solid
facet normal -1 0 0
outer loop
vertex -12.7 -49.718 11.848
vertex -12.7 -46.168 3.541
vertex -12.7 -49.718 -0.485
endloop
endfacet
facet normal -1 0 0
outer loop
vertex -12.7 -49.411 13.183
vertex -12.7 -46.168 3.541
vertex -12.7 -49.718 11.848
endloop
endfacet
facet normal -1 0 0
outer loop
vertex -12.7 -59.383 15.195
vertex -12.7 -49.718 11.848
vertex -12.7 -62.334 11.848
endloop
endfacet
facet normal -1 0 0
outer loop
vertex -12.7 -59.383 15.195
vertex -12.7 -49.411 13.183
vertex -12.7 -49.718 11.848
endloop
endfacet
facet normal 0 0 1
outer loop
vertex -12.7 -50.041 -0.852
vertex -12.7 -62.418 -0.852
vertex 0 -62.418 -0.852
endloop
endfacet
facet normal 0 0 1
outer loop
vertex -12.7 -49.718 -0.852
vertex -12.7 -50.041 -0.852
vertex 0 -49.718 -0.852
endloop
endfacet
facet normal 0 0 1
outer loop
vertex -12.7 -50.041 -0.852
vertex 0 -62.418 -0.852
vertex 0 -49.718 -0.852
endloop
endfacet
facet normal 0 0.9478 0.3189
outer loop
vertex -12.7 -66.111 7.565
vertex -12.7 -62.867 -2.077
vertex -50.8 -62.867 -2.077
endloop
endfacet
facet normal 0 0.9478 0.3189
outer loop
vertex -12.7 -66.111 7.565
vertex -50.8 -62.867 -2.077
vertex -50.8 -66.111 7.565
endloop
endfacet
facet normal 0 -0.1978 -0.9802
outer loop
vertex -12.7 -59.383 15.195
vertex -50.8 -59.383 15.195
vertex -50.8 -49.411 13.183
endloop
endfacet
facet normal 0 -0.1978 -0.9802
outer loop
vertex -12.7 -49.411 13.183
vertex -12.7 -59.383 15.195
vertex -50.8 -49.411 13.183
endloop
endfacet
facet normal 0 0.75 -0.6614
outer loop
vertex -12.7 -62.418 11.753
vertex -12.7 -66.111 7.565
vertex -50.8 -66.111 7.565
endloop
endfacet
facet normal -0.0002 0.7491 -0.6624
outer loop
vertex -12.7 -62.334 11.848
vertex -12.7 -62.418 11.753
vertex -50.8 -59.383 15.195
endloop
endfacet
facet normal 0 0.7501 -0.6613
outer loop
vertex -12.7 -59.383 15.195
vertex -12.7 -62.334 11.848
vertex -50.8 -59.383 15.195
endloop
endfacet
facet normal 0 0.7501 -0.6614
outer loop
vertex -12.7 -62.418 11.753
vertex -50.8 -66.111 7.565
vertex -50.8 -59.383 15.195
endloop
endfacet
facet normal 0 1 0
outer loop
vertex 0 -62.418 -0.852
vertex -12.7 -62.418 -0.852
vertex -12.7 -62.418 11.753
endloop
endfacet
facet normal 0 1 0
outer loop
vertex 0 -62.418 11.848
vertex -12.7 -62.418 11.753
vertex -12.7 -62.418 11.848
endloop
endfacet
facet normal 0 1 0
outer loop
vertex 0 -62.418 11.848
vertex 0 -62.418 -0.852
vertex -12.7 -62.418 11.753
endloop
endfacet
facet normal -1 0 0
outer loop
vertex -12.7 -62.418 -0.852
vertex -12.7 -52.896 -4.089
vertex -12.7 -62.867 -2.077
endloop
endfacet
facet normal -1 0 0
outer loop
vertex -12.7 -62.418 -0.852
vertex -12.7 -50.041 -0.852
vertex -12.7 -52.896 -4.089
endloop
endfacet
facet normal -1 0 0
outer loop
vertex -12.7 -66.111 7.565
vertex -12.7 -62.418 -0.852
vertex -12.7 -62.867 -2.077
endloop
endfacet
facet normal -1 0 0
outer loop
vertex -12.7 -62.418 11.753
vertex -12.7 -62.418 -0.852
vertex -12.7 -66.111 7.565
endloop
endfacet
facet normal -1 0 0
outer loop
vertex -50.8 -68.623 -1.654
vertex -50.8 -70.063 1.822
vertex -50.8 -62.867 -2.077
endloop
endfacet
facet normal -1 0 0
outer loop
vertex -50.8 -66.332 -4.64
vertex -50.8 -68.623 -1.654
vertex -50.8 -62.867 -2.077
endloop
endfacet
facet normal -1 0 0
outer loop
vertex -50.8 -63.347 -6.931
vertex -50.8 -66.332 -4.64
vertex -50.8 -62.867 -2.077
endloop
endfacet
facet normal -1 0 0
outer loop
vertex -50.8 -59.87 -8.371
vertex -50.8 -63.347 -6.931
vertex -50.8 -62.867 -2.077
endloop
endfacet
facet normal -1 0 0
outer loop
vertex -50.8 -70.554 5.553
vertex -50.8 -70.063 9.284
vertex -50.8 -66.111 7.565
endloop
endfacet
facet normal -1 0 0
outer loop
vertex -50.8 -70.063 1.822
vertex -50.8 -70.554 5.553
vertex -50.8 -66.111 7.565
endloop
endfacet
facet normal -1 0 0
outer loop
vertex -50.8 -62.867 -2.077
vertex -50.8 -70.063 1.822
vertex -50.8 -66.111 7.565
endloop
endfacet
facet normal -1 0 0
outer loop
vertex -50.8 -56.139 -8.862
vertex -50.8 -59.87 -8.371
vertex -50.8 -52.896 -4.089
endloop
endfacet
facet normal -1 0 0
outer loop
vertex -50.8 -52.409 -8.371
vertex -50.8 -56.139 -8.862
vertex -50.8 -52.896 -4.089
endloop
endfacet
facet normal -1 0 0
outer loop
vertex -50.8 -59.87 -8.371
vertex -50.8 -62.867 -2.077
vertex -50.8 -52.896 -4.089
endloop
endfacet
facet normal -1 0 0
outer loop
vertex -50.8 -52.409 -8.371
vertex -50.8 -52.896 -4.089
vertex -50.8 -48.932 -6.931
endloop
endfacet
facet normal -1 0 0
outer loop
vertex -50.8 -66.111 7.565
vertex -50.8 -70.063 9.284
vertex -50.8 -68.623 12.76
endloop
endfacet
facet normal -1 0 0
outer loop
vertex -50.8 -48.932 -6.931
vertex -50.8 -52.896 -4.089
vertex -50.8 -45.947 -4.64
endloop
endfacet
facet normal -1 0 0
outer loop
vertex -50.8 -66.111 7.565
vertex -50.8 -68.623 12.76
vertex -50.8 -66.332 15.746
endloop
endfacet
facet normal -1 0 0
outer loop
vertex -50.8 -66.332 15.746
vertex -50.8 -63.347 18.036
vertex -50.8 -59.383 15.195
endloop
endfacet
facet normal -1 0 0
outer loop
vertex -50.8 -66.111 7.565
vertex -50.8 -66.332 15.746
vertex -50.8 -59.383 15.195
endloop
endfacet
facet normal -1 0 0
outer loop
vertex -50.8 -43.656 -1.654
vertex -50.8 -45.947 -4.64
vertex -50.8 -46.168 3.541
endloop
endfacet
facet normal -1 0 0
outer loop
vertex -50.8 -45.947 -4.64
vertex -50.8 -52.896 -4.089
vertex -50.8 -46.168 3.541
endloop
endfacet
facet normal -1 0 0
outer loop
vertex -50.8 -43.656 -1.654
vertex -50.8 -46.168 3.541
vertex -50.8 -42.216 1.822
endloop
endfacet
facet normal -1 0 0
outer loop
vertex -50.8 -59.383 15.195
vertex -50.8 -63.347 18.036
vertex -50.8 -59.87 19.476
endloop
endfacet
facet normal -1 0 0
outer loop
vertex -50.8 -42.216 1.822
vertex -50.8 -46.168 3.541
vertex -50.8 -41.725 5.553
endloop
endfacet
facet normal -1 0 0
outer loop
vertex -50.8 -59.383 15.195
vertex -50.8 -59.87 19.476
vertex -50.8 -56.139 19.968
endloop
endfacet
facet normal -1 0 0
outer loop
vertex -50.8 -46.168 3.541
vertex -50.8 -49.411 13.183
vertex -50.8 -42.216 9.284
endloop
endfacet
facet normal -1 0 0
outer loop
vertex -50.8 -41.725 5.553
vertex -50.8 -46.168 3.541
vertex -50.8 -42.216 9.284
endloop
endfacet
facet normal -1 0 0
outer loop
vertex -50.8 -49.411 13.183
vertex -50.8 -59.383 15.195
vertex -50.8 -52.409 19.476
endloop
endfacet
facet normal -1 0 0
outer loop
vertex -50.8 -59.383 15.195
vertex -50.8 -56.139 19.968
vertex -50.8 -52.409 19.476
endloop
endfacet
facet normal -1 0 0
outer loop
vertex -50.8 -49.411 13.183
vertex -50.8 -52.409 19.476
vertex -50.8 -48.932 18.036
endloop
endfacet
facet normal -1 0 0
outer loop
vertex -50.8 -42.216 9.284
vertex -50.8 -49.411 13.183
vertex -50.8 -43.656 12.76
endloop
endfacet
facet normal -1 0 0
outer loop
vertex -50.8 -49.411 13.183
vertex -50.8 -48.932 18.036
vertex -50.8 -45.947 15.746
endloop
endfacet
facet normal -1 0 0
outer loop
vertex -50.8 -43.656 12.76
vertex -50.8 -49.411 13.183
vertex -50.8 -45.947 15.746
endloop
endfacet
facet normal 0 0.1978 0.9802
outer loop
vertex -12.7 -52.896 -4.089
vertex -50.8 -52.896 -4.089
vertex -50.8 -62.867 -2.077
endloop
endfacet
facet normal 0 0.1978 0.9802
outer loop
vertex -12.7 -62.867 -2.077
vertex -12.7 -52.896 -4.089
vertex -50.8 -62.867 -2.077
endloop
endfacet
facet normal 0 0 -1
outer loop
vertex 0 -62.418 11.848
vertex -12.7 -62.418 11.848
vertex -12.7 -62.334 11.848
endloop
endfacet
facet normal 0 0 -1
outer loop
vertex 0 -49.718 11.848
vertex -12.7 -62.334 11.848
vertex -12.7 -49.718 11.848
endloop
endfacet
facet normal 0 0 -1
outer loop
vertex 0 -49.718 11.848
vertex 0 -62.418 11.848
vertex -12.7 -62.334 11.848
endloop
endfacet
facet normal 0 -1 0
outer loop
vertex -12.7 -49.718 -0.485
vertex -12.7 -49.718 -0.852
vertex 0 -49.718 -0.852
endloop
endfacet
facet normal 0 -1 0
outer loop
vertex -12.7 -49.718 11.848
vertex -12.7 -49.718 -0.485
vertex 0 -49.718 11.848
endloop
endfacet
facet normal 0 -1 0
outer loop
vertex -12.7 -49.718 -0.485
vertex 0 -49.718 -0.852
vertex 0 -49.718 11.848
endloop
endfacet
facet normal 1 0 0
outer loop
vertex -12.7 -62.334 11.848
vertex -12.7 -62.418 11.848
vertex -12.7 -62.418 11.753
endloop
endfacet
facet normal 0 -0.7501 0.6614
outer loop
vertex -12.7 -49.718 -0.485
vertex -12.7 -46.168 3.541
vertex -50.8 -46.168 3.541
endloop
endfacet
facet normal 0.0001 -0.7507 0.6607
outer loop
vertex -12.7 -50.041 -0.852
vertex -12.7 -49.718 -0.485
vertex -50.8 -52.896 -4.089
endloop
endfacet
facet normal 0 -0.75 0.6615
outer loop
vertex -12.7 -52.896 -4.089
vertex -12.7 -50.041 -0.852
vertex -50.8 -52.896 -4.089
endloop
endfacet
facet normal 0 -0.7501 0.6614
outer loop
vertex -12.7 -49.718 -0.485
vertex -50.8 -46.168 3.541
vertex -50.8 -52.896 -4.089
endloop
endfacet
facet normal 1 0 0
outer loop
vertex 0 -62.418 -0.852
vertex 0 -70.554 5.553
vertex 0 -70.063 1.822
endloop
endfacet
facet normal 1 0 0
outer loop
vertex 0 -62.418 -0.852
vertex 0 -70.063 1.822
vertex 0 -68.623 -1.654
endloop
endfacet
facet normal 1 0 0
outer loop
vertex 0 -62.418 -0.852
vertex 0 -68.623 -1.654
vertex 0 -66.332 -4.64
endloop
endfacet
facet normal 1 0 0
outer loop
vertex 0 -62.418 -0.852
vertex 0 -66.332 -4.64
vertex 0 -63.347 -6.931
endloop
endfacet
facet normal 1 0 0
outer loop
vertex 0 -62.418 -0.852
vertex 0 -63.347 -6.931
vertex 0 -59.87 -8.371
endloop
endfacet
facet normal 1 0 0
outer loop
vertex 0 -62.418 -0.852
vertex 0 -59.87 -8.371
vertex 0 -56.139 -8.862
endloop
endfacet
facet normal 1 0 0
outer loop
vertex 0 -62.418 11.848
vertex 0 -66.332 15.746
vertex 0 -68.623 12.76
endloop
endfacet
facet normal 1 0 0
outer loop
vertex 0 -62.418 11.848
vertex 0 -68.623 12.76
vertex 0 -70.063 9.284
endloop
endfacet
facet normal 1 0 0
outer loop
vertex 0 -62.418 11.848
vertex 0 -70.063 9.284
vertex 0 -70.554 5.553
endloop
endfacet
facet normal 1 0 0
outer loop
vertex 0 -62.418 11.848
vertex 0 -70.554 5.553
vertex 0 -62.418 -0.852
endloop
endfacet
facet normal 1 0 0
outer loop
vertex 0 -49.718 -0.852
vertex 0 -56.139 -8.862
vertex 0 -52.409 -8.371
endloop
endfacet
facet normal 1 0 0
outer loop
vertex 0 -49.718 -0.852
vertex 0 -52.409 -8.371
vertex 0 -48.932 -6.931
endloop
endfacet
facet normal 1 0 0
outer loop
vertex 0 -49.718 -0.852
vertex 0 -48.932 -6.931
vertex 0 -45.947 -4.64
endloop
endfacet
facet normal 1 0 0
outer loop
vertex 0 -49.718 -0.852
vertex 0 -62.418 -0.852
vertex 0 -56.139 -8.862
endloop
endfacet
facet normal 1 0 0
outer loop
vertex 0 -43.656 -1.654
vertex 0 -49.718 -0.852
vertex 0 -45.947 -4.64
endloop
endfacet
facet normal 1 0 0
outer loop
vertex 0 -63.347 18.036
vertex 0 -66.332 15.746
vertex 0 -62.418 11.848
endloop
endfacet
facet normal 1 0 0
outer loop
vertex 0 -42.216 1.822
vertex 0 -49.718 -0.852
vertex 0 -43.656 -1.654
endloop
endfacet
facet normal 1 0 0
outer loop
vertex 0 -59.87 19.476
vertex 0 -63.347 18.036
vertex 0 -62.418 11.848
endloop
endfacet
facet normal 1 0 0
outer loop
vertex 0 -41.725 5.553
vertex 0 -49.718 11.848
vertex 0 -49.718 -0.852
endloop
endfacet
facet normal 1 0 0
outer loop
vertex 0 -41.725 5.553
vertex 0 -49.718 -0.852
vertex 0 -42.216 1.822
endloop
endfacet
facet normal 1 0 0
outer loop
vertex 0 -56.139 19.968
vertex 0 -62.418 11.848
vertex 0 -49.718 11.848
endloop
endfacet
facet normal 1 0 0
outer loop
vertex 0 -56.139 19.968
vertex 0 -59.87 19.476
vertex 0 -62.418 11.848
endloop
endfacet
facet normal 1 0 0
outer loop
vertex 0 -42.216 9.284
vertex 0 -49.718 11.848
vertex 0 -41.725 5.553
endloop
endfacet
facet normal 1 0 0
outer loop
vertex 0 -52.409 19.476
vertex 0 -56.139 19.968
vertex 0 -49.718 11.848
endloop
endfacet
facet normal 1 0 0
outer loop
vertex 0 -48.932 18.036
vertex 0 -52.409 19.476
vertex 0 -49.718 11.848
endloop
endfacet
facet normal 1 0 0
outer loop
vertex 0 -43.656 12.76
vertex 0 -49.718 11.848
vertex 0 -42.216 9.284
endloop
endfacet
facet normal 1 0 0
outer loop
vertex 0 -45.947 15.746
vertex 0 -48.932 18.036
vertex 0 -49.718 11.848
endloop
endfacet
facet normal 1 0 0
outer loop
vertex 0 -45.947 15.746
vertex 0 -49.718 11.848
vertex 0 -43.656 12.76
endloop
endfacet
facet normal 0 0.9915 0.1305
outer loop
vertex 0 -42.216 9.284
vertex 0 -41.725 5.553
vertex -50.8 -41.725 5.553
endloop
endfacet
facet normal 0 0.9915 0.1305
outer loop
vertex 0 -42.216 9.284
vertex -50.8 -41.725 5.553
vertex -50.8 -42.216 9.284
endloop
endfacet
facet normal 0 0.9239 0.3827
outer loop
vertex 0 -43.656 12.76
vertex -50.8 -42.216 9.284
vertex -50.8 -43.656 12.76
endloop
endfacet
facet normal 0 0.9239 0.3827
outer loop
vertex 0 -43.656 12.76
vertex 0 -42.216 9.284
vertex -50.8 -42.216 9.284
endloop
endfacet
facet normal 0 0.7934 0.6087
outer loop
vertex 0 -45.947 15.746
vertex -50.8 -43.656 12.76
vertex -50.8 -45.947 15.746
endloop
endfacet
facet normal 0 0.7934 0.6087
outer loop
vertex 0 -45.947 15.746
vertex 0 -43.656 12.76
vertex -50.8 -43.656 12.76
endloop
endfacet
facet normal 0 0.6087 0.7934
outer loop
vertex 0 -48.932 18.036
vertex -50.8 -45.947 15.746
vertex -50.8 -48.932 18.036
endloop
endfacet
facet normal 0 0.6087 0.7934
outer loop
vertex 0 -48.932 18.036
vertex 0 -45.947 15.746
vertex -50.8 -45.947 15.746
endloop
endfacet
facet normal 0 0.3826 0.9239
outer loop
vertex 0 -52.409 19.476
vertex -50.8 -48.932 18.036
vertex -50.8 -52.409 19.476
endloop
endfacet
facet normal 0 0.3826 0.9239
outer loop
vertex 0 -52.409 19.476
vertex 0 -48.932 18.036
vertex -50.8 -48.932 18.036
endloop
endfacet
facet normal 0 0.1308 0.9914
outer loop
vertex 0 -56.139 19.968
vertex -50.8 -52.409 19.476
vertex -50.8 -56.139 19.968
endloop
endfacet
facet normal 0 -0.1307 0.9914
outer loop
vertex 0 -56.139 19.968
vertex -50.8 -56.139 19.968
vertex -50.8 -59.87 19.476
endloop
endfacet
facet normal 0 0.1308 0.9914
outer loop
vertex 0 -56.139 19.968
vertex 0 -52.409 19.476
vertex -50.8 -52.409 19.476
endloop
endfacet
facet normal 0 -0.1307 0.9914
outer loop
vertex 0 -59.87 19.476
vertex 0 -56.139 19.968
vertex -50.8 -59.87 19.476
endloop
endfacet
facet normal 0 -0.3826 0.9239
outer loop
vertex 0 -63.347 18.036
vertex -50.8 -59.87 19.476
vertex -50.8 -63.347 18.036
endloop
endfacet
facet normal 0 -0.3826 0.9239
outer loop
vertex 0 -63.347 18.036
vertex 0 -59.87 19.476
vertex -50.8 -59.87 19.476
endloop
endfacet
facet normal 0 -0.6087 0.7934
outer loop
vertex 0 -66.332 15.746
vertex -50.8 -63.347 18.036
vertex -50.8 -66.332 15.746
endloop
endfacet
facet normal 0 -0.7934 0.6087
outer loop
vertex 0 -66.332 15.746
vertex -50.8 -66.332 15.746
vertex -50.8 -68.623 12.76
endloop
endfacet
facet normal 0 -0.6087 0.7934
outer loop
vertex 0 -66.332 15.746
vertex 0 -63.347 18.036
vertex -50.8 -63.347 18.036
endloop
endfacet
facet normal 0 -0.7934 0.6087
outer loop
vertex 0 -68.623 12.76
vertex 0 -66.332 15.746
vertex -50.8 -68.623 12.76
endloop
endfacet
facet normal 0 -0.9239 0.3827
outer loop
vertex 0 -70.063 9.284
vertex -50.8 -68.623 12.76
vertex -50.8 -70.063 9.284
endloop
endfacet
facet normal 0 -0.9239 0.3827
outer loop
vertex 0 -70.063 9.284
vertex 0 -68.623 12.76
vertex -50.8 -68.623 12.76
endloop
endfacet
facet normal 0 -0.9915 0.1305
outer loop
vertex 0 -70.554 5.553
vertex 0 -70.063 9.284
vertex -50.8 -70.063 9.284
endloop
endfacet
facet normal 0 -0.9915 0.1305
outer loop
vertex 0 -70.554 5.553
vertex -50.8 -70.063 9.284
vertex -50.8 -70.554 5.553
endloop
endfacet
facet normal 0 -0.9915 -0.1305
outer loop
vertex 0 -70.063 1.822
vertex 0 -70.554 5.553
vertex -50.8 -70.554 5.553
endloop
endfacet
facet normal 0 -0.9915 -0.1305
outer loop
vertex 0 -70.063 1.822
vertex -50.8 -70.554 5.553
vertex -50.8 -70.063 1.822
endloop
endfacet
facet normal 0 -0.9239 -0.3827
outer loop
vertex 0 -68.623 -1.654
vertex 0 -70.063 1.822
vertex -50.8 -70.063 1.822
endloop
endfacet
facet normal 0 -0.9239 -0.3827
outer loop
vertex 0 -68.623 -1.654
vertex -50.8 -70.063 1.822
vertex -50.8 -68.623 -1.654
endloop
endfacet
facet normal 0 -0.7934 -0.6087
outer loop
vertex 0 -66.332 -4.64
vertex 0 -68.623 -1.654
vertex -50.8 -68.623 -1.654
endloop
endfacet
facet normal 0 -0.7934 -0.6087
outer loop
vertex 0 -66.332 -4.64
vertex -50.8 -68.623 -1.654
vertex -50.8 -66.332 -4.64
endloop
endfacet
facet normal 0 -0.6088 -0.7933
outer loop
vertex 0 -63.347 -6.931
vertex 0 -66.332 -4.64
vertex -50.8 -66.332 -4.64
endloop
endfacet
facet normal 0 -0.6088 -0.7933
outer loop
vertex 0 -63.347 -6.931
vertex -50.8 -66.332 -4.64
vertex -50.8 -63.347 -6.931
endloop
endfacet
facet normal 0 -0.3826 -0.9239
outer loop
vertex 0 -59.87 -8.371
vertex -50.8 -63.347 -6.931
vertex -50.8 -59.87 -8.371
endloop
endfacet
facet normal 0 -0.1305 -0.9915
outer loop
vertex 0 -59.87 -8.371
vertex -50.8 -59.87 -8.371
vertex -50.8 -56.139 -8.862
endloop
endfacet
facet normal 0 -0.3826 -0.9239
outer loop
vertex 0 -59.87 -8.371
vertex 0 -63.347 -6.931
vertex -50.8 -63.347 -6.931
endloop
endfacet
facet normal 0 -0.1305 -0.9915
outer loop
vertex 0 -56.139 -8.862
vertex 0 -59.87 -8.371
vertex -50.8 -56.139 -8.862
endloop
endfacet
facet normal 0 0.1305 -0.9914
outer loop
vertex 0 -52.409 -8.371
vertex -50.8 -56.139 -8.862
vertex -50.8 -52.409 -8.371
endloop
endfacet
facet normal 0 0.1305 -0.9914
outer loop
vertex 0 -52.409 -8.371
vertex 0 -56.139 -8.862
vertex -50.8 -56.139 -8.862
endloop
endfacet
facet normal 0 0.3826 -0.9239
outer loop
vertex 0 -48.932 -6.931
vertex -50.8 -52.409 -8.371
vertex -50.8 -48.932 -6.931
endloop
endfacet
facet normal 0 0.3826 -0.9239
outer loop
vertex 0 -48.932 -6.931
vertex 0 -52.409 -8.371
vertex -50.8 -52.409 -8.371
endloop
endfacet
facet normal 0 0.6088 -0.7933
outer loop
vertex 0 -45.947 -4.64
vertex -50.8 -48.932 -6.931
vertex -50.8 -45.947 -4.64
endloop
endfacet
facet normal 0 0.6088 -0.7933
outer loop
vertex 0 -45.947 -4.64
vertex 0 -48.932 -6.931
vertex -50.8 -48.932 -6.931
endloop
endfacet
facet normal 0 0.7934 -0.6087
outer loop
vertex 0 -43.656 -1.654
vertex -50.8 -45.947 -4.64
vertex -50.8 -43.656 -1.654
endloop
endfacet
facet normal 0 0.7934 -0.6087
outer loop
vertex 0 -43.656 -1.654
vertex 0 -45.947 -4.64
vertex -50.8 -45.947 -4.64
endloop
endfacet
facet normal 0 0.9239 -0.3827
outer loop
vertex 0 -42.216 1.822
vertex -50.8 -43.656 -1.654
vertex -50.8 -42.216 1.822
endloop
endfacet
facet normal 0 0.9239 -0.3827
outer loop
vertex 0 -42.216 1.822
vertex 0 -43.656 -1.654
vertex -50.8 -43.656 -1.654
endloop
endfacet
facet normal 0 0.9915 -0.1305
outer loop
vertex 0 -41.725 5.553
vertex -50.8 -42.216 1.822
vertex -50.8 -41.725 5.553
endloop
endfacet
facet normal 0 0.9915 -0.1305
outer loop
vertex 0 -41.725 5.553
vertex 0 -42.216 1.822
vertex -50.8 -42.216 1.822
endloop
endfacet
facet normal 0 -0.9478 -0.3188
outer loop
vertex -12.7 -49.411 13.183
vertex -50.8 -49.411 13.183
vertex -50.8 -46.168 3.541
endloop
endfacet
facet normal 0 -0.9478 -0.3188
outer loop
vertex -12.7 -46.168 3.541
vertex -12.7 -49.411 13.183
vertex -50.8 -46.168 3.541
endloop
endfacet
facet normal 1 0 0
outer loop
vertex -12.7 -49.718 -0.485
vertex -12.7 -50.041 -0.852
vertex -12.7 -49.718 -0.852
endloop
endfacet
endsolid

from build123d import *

# Parameters (mm, degrees)
F0_R     = 14.414674
F1_DEPTH = 50.8
F2_W     = 12.7
F2_H     = 12.7
F3_DEPTH = 12.7
F5_DEPTH = 38.1


with BuildPart() as f1:
    # F0 (on Right) → F1 (new body)
    with BuildSketch(Plane.YZ):
        with Locations((-56.139331, 5.552941)):
            Circle(F0_R)
    extrude(amount=-F1_DEPTH)

    # F2 (on face) → F3 (cut)
    with BuildSketch(Plane.YZ):
        with Locations((-56.067919, 5.498222)):
            Rectangle(F2_W, F2_H)
    extrude(amount=-F3_DEPTH, mode=Mode.SUBTRACT)

    # F4 (on face) → F5 (cut, through all)
    with BuildSketch(Plane(origin=(-50.8, 0, 0), x_dir=(0, -1, 0), z_dir=(-1, 0, 0))):
        Polygon((62.867289, -2.07704), (66.111067, 7.564533), (59.383109, 15.194513), (49.411373, 13.182921), (46.167595, 3.541348), (52.895554, -4.088632), align=None)
    extrude(amount=-F5_DEPTH, mode=Mode.SUBTRACT)


solid = f1.part
